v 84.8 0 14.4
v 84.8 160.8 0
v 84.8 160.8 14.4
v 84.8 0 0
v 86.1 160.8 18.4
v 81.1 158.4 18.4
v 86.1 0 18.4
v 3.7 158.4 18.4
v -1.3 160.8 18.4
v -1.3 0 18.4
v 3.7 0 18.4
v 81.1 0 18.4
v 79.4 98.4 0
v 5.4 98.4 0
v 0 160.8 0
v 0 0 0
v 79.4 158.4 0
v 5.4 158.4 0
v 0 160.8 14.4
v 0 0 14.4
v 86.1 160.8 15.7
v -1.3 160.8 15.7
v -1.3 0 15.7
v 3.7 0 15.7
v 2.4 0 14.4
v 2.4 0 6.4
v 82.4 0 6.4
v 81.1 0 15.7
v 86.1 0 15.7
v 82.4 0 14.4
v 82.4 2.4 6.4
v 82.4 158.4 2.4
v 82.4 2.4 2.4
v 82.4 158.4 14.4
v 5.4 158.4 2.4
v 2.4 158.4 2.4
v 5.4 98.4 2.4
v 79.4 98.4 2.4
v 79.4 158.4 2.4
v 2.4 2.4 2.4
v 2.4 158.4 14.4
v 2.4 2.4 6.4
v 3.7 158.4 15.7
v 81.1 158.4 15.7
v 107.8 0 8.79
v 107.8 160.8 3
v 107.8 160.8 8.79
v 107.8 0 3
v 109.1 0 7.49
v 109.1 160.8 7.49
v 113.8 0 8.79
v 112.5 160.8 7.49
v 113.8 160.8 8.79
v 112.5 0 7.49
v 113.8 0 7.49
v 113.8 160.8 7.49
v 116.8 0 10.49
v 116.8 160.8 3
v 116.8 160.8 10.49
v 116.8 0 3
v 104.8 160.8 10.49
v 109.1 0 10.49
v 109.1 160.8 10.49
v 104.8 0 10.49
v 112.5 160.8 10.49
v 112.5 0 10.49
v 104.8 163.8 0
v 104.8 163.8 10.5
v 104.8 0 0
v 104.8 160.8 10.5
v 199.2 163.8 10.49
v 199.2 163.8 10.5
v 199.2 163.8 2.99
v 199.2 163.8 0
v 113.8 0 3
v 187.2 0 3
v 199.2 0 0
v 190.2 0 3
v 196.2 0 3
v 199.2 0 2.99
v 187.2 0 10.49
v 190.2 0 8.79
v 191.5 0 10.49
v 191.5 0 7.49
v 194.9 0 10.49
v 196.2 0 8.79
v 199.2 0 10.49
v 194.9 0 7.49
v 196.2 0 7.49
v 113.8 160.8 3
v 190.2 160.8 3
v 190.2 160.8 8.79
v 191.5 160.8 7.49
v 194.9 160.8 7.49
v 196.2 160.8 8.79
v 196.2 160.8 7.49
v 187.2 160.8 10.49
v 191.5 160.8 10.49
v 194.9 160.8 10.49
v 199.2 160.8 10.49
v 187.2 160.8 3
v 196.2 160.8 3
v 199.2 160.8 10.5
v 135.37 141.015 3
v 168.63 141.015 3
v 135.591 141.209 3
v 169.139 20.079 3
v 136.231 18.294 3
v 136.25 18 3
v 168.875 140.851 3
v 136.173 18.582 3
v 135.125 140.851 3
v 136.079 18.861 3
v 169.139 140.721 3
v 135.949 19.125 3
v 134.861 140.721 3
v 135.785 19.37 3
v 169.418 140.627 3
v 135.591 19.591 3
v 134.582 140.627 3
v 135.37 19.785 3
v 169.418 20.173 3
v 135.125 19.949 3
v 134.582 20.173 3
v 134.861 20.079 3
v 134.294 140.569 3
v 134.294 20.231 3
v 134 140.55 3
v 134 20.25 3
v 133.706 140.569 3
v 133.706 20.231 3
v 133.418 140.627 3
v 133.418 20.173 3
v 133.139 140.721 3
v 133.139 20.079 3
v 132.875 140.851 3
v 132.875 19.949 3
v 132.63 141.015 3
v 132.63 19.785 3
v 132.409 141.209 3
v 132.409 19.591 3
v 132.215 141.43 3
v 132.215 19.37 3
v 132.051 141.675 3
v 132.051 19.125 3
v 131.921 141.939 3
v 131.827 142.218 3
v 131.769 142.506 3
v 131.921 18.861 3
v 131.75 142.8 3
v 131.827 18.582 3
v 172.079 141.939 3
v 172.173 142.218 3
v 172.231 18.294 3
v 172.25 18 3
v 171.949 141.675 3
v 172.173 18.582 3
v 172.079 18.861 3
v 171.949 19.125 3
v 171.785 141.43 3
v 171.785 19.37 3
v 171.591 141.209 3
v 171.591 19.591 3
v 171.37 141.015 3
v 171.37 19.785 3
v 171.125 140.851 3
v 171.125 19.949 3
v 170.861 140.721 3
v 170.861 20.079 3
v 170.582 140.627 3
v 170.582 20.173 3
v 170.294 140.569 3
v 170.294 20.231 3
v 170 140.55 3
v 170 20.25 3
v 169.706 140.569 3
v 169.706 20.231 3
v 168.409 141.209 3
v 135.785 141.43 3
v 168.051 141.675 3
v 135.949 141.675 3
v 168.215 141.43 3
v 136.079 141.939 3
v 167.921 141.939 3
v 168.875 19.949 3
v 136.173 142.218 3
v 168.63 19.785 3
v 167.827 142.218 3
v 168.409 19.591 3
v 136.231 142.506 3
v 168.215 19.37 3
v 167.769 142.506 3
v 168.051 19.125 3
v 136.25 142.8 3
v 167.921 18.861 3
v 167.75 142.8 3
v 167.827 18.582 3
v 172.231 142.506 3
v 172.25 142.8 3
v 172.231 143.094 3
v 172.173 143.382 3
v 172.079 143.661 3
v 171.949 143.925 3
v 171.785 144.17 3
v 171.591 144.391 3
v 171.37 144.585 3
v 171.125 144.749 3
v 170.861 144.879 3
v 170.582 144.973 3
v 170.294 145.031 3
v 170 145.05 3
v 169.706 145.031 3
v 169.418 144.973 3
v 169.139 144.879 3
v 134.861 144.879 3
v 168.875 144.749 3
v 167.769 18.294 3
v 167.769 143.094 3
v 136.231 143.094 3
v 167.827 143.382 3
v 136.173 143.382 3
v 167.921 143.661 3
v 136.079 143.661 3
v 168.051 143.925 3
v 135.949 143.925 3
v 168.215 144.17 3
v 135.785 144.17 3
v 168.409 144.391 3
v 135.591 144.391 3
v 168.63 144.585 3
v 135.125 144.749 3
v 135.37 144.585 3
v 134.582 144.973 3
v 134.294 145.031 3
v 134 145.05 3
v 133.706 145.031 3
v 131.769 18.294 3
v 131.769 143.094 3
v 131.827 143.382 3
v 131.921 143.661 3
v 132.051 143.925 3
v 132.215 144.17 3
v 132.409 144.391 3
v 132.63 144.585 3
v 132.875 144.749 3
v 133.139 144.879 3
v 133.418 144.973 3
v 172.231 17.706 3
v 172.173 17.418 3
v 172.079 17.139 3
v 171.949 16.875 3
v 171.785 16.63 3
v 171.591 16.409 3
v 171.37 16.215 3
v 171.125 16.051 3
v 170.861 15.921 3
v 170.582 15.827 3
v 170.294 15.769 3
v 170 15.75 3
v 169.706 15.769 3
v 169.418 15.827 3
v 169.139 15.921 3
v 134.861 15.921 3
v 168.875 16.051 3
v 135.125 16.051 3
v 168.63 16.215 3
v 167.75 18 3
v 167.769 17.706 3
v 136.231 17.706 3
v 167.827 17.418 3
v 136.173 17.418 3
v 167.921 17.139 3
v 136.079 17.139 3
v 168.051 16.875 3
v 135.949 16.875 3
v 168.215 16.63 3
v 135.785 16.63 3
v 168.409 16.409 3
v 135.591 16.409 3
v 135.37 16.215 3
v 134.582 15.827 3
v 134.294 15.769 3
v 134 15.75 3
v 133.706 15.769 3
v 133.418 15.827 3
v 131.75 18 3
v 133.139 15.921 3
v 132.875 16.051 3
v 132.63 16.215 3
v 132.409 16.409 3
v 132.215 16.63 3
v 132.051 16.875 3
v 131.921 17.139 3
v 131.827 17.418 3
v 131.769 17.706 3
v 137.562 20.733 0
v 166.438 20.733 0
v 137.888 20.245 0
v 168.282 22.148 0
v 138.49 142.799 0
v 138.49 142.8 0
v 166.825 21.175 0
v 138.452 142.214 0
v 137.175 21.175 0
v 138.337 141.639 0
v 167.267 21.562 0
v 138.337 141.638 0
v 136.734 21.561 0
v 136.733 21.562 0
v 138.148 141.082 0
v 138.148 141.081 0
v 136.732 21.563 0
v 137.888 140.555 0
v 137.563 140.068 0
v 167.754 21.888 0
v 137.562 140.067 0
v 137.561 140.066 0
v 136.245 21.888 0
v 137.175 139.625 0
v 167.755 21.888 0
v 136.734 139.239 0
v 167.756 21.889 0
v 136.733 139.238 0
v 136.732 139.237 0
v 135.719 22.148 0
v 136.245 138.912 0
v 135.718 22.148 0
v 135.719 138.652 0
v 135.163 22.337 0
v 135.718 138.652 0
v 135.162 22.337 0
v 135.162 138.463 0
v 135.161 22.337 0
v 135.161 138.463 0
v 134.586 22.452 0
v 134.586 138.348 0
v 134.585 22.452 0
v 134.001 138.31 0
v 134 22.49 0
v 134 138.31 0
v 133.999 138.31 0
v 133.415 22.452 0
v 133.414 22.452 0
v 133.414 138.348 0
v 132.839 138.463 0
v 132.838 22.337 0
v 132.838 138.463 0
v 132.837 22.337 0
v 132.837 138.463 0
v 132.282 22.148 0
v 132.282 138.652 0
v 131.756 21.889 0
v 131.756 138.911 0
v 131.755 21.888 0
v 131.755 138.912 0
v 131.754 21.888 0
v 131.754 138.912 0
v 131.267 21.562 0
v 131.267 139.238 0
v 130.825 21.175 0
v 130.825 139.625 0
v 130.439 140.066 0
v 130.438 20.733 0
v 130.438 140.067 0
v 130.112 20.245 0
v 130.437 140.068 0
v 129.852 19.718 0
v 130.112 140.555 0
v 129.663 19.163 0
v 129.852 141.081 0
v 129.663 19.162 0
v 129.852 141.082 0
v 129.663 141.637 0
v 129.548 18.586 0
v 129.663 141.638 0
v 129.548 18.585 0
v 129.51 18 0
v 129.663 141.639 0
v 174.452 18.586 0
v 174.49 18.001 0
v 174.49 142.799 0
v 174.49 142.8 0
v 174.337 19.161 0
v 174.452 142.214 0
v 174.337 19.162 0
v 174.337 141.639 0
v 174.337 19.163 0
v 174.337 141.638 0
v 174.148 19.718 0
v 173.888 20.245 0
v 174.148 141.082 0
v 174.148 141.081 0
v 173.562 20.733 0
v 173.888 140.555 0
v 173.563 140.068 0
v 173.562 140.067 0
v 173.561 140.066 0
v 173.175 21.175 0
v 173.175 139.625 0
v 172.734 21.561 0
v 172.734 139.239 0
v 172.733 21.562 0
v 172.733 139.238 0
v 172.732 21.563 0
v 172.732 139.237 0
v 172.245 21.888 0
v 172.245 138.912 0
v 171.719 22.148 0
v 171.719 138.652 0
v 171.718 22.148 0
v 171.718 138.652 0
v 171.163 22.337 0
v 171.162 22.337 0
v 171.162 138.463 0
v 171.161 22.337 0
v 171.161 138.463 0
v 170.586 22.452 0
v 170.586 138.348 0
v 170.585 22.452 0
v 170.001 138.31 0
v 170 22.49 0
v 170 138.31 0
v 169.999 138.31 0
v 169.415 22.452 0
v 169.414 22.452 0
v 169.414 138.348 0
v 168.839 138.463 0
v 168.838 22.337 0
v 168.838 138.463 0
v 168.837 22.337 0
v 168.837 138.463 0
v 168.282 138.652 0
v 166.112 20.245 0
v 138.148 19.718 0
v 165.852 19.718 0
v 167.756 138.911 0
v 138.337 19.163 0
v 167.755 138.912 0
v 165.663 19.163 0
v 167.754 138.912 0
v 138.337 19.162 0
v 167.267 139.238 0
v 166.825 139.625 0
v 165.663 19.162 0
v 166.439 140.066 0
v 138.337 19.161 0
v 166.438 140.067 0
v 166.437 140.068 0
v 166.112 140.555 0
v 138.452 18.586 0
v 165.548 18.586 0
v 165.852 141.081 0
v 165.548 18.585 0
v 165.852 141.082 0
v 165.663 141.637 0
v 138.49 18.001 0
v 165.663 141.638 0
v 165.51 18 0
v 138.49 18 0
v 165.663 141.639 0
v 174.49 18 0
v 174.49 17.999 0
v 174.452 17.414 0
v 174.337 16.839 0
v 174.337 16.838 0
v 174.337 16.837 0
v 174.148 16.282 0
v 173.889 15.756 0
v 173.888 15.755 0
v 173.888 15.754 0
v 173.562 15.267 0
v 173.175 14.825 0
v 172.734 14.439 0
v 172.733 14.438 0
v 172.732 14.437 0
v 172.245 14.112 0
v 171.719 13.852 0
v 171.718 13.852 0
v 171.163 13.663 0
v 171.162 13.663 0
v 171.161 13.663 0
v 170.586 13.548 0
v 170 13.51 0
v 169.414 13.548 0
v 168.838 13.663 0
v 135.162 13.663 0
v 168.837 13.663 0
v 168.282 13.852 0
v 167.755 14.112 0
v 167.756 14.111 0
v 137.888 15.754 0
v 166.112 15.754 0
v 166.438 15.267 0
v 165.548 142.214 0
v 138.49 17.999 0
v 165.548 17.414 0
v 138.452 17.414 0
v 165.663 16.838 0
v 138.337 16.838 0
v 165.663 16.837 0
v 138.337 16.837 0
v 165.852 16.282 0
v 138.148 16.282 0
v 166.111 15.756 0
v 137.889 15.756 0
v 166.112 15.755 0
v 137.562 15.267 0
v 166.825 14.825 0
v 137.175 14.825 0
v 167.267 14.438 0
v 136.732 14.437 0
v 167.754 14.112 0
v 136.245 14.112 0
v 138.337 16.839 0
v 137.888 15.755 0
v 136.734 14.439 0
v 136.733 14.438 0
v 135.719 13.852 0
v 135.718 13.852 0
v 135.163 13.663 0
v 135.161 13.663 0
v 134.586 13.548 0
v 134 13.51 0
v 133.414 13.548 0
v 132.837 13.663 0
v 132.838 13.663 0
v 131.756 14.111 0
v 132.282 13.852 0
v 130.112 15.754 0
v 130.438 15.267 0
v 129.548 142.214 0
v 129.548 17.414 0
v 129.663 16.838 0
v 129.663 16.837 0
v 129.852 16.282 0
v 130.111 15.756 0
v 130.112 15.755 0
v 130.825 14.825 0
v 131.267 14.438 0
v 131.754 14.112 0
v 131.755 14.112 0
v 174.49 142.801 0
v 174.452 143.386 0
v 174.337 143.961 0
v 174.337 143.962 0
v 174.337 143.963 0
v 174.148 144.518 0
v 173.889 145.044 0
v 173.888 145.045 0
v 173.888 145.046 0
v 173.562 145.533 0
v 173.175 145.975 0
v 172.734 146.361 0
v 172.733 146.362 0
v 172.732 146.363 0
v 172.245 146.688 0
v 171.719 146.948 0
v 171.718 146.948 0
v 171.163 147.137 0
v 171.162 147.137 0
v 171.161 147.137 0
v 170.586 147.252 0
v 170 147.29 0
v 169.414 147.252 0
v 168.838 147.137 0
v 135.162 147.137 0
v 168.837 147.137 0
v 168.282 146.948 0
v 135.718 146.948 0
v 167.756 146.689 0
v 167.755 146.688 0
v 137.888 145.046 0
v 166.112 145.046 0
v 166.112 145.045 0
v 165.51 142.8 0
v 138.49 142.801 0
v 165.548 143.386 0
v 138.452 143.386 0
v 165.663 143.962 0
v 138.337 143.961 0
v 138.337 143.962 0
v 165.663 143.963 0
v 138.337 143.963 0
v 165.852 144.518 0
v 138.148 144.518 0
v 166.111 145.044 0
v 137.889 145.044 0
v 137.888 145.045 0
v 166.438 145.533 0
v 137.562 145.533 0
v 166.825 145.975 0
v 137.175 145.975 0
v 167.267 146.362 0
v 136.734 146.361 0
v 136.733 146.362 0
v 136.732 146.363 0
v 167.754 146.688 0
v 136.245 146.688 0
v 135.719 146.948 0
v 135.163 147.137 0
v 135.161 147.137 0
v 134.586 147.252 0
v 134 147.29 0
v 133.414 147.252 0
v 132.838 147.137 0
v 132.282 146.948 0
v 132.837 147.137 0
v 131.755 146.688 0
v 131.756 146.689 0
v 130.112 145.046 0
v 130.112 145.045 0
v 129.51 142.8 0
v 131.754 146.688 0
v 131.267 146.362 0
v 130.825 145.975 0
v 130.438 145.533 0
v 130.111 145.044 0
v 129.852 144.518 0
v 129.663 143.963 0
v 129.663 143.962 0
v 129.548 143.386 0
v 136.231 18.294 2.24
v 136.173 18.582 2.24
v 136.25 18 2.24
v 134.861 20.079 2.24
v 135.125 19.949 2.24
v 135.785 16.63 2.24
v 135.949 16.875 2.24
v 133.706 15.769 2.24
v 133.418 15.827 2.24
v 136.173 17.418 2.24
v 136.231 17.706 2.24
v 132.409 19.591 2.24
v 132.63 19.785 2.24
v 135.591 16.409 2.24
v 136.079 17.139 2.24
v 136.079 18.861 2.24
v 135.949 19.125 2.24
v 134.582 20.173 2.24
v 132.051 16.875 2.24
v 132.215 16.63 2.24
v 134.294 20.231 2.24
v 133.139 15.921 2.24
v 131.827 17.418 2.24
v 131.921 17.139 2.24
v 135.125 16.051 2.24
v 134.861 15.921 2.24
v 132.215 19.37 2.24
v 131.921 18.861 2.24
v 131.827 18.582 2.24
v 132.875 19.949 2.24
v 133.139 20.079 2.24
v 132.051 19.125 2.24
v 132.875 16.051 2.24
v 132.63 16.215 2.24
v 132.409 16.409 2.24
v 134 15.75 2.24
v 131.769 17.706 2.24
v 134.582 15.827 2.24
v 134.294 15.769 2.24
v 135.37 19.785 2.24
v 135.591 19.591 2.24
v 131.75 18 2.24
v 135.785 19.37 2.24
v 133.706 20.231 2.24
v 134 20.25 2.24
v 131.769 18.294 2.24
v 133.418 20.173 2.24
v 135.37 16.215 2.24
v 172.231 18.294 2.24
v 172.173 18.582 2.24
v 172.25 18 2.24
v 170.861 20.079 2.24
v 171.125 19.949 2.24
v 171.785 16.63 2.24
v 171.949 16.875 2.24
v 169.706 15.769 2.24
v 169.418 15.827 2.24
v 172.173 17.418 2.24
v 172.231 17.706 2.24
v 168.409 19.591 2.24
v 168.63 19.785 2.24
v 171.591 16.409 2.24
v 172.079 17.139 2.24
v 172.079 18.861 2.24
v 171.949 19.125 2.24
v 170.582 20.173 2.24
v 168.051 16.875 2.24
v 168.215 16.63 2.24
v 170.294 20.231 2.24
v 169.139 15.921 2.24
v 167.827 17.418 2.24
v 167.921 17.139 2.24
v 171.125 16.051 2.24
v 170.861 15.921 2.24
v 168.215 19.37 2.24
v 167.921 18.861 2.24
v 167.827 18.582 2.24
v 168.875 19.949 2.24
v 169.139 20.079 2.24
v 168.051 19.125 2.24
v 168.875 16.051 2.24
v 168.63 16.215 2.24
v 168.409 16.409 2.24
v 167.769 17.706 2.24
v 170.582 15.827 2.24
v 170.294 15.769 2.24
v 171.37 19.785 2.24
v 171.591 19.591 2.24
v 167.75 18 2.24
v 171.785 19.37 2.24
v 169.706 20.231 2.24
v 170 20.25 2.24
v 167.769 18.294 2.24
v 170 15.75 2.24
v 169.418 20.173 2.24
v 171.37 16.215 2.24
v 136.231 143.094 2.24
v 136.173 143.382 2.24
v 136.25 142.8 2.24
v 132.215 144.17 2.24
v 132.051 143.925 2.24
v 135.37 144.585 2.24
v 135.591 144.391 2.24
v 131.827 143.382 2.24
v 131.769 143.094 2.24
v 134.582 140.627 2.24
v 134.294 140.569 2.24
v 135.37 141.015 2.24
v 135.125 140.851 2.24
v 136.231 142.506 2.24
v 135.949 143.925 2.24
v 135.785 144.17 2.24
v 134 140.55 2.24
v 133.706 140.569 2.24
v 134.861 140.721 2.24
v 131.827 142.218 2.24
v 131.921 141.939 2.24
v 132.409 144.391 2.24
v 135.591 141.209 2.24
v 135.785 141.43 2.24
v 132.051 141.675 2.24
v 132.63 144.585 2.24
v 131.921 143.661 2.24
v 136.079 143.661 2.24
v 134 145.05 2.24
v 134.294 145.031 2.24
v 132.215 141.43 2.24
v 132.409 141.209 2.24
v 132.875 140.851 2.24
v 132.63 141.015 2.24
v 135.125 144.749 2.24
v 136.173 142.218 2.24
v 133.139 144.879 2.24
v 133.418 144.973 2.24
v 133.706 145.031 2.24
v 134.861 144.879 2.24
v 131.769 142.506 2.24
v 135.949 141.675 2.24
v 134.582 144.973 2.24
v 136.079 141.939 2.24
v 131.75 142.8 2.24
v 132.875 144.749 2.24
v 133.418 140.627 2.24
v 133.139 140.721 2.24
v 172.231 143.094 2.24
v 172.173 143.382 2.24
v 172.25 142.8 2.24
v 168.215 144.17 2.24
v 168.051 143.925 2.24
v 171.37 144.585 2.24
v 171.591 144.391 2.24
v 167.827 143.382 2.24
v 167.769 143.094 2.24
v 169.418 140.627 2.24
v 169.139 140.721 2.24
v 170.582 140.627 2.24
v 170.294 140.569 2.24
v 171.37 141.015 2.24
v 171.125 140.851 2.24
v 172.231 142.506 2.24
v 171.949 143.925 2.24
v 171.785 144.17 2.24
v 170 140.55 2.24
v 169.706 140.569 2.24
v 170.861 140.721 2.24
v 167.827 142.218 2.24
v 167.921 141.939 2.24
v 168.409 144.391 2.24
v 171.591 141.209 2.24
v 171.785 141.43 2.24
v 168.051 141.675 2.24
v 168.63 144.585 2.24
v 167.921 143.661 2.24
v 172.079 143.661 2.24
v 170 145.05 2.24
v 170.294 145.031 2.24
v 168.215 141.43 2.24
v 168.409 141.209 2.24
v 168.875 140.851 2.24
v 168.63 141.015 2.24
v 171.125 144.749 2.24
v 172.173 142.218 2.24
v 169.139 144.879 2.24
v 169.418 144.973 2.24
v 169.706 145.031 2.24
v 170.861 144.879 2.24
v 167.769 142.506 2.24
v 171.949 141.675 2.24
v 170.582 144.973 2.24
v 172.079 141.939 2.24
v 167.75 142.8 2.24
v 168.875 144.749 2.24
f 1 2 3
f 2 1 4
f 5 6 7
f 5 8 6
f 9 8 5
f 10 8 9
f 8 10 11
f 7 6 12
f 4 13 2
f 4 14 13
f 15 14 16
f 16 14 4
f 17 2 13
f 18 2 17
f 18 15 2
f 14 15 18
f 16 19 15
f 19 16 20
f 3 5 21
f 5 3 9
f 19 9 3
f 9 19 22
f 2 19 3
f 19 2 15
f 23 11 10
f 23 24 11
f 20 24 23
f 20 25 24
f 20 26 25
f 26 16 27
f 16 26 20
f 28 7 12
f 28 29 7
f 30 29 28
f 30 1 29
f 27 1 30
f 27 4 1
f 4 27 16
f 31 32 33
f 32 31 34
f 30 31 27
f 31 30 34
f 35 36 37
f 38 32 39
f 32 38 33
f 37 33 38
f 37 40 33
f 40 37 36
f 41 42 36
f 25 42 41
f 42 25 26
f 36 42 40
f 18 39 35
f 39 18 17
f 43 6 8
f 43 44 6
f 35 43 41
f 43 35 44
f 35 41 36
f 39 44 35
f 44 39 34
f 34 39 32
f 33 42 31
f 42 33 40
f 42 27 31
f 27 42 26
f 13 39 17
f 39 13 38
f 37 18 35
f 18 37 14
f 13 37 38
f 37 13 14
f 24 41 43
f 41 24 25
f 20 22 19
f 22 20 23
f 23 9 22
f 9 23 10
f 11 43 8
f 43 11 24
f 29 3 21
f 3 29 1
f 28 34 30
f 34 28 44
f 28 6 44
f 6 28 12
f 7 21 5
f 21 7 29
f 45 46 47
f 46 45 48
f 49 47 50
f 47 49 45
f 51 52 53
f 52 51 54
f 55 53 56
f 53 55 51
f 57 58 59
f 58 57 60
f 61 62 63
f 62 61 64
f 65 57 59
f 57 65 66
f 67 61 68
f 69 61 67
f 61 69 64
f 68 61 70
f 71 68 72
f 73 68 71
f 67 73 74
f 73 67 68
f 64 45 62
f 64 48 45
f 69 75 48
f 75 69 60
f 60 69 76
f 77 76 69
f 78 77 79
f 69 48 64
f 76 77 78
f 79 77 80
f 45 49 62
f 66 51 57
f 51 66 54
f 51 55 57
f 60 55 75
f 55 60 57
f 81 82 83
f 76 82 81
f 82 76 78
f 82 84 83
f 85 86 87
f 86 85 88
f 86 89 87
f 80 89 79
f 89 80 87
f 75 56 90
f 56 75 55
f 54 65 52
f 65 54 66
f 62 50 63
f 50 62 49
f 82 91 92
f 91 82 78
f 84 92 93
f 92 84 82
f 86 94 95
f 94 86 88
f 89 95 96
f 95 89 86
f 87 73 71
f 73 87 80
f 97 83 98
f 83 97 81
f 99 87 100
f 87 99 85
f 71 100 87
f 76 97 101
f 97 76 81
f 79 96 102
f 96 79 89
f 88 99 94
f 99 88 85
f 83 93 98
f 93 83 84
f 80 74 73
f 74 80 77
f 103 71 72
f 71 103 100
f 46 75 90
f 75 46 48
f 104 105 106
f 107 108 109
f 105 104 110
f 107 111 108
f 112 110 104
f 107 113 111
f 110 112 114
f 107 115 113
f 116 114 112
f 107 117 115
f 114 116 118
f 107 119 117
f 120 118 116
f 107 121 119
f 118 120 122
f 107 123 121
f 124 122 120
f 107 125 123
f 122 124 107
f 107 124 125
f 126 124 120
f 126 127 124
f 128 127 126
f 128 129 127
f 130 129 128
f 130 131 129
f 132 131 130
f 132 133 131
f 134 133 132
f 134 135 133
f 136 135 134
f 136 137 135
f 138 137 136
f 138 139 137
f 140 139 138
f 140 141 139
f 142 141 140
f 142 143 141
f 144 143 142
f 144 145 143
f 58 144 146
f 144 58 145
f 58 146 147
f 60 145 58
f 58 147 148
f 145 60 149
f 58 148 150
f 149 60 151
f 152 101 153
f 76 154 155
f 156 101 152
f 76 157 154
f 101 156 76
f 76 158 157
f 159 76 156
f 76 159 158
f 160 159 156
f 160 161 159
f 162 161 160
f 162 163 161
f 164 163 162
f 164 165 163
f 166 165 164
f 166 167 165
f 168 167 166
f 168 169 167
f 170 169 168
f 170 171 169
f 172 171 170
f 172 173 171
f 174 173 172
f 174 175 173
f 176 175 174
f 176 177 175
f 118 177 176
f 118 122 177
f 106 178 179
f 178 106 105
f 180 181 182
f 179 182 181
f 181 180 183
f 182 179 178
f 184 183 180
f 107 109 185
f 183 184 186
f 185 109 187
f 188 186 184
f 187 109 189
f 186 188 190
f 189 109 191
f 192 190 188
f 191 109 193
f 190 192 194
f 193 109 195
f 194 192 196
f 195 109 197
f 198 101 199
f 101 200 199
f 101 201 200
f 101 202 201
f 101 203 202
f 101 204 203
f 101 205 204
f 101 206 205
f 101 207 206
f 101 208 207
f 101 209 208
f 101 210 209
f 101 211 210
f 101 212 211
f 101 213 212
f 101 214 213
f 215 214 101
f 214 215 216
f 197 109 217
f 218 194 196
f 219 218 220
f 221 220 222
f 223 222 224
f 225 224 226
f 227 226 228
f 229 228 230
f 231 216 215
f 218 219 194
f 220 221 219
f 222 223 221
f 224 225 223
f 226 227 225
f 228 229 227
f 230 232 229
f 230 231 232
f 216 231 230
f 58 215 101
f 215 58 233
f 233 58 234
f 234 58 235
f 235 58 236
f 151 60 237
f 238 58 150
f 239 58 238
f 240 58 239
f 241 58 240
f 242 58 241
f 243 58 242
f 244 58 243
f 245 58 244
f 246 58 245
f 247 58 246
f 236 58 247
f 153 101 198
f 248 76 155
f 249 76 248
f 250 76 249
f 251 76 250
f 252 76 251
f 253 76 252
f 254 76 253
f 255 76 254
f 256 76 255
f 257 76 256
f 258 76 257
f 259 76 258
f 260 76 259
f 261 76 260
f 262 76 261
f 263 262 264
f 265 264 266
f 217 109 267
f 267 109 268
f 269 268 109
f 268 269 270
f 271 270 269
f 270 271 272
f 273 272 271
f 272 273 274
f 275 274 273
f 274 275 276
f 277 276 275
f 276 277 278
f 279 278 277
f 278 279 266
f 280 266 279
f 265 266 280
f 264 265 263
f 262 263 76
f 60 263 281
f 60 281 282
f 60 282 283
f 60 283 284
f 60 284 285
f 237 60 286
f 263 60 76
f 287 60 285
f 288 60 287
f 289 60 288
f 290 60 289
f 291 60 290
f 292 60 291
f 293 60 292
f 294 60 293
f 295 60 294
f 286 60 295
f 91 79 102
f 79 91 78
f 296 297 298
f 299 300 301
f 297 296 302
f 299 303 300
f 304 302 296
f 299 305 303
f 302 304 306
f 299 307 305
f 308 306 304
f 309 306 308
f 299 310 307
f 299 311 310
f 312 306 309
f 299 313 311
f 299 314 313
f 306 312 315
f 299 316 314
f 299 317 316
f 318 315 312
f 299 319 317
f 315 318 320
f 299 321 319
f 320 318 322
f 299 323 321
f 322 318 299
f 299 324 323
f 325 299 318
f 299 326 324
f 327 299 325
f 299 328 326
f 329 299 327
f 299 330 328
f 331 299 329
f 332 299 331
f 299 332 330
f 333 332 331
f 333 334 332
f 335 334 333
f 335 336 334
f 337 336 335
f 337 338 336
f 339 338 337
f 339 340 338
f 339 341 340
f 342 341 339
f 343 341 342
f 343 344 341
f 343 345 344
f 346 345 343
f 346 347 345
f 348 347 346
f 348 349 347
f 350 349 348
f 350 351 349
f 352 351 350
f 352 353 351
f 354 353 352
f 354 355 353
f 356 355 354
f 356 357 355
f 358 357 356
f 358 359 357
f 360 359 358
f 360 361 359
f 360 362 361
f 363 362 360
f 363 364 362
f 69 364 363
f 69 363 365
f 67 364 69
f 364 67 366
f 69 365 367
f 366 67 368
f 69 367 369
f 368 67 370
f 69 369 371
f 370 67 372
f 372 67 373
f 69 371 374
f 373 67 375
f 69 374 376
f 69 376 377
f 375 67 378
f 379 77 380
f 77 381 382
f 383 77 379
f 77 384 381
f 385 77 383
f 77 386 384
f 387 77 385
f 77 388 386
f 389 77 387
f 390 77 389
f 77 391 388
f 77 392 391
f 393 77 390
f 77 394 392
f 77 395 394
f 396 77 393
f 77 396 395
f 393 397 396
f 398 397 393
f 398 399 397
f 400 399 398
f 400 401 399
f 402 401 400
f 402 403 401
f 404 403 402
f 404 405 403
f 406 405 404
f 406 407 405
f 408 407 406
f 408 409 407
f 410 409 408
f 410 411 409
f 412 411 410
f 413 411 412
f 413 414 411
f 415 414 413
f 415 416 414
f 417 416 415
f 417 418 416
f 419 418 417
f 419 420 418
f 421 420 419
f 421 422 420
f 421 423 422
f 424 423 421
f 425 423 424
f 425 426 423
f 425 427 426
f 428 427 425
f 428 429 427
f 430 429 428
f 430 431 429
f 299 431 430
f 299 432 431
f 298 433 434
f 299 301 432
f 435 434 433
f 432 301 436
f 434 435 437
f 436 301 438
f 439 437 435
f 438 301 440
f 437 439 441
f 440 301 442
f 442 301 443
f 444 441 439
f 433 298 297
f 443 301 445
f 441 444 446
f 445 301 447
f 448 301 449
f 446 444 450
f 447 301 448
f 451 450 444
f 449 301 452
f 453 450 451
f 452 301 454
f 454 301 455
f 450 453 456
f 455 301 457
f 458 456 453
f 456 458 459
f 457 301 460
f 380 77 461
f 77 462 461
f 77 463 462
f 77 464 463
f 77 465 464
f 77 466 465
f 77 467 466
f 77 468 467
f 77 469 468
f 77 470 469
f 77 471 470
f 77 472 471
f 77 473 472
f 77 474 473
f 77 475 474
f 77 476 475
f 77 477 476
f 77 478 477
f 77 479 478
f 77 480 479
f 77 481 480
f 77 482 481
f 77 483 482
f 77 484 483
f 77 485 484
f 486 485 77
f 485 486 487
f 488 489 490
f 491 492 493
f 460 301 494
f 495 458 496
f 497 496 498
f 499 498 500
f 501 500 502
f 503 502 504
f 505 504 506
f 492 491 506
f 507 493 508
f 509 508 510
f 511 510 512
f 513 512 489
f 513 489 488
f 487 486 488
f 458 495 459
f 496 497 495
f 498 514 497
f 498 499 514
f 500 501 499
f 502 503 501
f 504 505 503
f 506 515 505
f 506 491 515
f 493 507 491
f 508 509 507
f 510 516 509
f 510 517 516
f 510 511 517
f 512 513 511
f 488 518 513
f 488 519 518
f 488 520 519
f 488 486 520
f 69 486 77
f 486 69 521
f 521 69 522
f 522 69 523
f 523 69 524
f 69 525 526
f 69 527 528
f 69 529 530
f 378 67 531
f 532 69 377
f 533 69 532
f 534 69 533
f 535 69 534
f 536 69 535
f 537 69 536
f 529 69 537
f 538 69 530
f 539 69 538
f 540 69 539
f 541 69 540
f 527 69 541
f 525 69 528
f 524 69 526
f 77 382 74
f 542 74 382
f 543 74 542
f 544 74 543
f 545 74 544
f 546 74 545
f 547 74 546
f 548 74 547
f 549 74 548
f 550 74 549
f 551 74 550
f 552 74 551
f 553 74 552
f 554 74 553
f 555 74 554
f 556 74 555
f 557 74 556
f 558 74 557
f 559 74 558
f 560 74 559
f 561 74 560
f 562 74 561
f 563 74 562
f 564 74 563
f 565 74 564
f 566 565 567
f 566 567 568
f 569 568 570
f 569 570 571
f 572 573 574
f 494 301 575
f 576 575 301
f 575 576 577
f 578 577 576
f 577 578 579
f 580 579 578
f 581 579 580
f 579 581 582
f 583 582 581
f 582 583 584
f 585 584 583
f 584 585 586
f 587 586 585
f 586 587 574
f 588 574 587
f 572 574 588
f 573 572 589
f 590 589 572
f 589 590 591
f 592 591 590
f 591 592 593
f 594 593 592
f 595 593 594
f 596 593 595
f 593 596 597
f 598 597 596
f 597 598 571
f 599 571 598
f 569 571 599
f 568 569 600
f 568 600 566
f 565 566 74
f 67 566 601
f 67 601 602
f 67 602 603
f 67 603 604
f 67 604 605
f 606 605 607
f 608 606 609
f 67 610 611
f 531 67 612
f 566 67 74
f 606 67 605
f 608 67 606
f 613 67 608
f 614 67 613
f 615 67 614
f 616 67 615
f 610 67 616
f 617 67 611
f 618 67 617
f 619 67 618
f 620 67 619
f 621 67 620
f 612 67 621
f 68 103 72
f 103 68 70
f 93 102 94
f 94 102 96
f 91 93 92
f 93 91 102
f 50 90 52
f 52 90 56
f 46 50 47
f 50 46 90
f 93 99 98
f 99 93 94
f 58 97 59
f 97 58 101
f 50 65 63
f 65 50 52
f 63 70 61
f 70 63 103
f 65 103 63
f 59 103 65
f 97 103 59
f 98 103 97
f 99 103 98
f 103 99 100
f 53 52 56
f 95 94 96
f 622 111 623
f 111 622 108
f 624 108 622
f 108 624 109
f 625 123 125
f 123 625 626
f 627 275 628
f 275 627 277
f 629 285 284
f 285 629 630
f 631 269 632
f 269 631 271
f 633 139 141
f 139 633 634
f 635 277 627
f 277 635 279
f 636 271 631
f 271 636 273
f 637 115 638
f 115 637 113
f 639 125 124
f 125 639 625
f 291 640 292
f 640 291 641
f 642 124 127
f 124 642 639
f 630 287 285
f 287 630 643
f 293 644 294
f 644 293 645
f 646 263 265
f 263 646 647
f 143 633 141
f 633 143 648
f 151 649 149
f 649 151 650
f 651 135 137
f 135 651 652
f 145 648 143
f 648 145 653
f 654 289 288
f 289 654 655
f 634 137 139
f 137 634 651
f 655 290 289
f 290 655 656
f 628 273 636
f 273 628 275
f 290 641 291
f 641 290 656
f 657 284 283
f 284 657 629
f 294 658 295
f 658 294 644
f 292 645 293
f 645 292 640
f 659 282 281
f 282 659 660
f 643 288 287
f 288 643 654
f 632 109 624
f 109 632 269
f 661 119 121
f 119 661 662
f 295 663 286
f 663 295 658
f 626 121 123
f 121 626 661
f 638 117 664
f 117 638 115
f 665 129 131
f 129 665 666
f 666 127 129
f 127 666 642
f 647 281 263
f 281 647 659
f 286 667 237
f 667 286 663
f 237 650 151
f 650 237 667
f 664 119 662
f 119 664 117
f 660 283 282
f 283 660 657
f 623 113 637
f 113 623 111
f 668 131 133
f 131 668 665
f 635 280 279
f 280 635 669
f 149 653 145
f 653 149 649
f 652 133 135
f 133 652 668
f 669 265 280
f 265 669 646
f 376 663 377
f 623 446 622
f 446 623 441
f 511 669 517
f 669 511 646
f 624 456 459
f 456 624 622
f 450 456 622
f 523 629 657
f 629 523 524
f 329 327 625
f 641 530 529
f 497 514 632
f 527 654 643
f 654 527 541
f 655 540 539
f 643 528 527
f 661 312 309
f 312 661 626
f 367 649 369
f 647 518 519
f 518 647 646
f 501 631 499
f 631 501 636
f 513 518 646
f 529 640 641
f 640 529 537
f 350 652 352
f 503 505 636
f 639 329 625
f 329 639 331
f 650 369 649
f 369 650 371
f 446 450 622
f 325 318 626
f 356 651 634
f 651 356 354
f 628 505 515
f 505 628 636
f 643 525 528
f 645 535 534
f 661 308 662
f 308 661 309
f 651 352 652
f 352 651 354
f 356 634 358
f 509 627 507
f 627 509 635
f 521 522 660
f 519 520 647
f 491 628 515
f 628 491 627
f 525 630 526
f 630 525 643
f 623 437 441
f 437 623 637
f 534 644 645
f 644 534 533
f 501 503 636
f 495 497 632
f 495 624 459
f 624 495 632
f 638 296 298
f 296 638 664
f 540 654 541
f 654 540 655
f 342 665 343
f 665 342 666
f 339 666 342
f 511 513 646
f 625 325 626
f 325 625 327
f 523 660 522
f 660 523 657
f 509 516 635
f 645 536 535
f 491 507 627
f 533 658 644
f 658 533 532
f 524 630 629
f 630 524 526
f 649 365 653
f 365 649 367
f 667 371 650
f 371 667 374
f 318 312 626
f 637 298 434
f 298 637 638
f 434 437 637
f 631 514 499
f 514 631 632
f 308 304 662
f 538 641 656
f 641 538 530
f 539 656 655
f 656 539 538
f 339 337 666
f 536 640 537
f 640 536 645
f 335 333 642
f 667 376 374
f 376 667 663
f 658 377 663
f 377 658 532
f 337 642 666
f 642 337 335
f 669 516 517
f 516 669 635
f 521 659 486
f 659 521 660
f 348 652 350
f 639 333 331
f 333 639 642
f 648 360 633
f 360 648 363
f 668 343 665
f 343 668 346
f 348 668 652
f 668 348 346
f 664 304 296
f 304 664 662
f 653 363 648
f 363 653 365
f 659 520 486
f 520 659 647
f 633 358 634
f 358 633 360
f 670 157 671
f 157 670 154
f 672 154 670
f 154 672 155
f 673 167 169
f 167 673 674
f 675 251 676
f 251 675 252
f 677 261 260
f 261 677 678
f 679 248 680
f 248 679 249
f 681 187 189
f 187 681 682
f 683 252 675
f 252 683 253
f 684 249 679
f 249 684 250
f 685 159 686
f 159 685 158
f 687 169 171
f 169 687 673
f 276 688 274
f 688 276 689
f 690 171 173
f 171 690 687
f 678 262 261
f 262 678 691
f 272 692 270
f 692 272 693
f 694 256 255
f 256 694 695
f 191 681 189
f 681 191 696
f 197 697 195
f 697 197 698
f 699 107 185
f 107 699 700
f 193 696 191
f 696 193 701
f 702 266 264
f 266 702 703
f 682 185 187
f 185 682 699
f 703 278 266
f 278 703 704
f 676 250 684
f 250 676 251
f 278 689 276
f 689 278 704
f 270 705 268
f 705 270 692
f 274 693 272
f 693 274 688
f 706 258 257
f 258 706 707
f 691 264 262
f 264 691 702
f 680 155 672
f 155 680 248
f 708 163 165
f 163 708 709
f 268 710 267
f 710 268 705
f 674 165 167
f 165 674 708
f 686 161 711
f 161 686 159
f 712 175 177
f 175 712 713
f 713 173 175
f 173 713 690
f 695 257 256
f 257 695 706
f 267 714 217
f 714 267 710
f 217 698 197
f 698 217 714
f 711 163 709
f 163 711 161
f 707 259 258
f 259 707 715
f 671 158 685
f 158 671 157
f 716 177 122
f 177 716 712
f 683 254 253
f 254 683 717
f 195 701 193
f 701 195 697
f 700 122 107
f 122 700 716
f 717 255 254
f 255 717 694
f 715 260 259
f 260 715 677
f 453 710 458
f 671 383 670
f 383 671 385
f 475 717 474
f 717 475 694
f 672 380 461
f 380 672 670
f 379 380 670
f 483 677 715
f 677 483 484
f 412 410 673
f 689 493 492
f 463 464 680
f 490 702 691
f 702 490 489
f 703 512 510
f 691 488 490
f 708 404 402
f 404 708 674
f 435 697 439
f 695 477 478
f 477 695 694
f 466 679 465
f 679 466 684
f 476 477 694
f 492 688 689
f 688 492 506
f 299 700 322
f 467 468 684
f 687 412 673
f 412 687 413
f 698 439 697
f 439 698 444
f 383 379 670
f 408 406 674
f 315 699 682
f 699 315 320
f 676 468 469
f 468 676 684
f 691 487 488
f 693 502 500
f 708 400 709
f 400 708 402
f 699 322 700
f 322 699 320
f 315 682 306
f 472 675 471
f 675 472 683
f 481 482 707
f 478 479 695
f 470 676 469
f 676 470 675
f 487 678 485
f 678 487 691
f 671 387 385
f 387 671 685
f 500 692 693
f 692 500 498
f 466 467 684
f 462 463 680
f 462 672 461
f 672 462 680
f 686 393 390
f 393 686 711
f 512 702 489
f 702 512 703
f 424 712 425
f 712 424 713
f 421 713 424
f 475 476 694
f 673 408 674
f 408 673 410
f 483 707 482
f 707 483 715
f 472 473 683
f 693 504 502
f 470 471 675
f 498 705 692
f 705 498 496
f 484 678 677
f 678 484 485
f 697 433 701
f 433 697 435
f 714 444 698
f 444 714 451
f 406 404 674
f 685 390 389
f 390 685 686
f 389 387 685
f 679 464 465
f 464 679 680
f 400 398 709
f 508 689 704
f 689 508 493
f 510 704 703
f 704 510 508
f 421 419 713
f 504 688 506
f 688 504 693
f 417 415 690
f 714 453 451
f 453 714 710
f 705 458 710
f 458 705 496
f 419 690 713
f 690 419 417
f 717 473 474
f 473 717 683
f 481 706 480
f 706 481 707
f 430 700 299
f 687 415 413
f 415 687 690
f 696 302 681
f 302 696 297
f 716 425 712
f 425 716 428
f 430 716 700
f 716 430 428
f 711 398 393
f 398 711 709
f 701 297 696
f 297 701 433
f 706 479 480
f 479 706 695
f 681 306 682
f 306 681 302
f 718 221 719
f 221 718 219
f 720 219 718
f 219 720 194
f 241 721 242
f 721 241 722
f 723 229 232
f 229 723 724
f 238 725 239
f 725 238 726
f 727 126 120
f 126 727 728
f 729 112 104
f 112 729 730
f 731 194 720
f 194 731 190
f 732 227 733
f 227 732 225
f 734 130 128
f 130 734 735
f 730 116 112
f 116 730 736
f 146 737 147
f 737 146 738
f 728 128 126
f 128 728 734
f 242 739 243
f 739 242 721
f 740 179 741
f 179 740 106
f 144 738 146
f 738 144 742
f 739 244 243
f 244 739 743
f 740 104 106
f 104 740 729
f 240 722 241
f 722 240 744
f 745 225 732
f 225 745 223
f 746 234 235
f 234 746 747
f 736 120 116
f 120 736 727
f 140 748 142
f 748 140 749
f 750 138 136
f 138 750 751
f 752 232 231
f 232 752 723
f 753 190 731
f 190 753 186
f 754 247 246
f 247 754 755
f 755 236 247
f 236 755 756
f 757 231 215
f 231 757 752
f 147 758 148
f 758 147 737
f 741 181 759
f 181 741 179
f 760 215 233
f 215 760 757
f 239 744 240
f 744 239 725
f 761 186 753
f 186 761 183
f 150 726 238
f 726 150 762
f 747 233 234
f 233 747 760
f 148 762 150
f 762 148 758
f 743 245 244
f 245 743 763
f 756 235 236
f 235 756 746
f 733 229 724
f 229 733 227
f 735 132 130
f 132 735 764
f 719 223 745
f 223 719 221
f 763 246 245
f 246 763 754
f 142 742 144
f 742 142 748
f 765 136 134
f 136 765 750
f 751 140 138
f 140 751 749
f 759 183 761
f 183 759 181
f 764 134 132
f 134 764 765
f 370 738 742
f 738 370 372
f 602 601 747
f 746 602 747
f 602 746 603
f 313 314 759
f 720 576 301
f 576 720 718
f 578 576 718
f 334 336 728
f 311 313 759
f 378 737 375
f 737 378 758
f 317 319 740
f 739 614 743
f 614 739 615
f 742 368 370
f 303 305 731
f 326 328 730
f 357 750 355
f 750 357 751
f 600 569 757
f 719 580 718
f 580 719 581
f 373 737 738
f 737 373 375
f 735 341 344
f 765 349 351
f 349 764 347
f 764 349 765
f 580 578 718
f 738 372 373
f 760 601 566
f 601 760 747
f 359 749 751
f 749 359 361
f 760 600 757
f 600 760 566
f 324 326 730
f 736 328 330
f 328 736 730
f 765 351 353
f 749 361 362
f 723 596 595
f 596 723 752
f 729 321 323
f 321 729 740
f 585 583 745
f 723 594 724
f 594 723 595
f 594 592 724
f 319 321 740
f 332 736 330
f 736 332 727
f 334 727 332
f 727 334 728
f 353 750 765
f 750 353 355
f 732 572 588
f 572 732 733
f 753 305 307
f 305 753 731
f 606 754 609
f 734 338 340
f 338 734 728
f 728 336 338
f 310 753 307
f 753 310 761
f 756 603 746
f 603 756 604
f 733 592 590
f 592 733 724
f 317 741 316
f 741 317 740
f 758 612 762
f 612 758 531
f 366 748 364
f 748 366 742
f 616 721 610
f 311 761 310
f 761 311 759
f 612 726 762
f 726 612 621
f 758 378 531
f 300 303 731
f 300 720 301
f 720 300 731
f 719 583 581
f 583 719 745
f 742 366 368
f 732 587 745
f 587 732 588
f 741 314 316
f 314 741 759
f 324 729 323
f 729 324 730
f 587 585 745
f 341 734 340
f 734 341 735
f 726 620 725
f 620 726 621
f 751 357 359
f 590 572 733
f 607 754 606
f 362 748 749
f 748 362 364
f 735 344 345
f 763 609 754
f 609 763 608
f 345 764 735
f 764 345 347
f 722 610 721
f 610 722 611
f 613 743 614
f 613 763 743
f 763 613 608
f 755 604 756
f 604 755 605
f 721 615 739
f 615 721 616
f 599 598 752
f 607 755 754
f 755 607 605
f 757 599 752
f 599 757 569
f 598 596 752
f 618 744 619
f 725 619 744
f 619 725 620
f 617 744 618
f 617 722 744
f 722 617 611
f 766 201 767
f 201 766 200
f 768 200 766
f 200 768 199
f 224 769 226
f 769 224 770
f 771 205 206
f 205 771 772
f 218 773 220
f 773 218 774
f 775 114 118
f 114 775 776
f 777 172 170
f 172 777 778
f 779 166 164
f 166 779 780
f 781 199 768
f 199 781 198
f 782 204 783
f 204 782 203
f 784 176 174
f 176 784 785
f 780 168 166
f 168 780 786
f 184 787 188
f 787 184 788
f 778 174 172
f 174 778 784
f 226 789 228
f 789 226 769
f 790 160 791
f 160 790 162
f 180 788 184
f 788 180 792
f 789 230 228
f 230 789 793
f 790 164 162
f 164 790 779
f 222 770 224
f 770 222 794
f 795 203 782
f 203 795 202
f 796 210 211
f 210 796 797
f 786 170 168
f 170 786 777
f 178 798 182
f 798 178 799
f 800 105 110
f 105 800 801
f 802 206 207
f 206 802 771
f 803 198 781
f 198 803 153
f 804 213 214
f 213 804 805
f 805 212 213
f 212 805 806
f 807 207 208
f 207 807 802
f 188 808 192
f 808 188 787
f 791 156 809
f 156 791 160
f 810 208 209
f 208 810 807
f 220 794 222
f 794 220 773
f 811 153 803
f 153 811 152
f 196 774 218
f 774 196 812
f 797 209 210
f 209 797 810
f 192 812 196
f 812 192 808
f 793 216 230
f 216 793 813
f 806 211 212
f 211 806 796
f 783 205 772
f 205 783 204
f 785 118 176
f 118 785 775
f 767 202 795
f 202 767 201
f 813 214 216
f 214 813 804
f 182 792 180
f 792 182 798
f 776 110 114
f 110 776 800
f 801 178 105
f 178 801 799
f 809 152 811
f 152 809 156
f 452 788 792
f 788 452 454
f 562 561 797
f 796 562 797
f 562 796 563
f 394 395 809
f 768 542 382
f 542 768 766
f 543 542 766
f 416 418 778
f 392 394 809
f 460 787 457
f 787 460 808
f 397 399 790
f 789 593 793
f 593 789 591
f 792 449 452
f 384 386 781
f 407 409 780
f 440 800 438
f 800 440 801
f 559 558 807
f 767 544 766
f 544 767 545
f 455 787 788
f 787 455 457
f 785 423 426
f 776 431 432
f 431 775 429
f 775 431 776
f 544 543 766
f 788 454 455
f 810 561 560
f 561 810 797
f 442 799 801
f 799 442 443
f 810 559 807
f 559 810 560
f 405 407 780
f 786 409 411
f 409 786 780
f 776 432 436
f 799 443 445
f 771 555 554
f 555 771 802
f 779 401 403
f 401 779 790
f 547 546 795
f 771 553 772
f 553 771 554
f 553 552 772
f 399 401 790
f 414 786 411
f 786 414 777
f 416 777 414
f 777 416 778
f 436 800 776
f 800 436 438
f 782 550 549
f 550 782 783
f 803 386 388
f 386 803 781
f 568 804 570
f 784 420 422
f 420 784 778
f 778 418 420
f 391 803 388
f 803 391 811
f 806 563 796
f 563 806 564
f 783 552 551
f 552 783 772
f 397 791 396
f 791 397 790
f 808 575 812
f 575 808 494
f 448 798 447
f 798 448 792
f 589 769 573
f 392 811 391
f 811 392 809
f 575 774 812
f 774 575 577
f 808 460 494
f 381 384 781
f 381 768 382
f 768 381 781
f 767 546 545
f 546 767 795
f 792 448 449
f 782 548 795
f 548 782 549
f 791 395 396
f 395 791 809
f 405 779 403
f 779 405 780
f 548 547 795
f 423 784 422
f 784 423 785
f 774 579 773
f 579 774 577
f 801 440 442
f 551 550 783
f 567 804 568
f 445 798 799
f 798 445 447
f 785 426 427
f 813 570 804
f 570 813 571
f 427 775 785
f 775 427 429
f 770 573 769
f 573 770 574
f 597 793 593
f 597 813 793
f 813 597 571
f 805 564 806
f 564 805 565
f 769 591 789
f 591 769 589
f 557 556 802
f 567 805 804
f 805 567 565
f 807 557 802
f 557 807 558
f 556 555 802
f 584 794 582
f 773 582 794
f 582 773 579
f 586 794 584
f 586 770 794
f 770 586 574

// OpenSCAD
// A ceiling pocket for a phone used as Lantern's camera over the cutting table.
//
// Two printed parts and four screws:
//   plate   screws to the ceiling, with a C-channel along each side.
//   pocket  a tray with a solid floor and a window for the camera; a bead
//           along the top of each wall slides into the plate's channels.
// The phone drops into the pocket from its open end, screen towards the
// ceiling, camera end first, and lies on the floor with its camera looking
// down through the window. Nothing clips or grips it: a lip at the open end
// stops it sliding out, and it comes out by pushing it up through the
// window and drawing it back. The fit is loose on purpose; measure the phone
// in its case and put the numbers below, in millimetres.
//
// Both parts print without supports: the pocket floor down, the plate flat
// with its channels up. Use PETG if it will sit near the projector's warm
// air; PLA sags around 55 °C.
//
// Render with OpenSCAD:
//   openscad -o pocket.stl -D 'part="pocket"' phone-pocket.scad
//   openscad -o plate.stl  -D 'part="plate"'  phone-pocket.scad

// ---------- the phone, in its case
phone_w = 76;   // width (the short side)
phone_l = 152;  // length
phone_t = 10;   // thickness, including the camera bump

// ---------- the pocket
clearance = 2;      // each side, so it drops in and out without a fight
headroom = 6;       // above the phone, so it can tilt in over the lip
wall = 2.4;
floor_t = 2.4;
lip = 4;            // height of the lip across the open end, above the floor
window_l = 60;      // the window's length from the closed end: covers any phone's camera island
window_rail = 3;    // floor left either side of the window; a phone camera is at least 5 mm from the edge

// ---------- the slide
bead = 1.3;         // how far the top bead of each wall stands proud, each side
bead_h = 4;
slide_gap = 0.5;    // clearance in the channel; raise it if the slide is tight on your printer
post = 3;           // channel wall thickness
plate_t = 3;
screw_d = 4.5;      // clearance for a 4 mm screw
screw_head = 9;     // countersink

part = "both";      // "pocket", "plate", "both" (side by side), "fitted" (the plate on the pocket) or "cut" (a slice through the slide)

// ---------- derived
inner_w = phone_w + 2 * clearance;
inner_l = phone_l + 2 * clearance;
inner_h = phone_t + headroom;
outer_w = inner_w + 2 * wall;
outer_l = inner_l + 2 * wall;
wall_h = floor_t + inner_h;          // the walls' full height, bead included
channel_in_w = wall + 2 * bead + 2 * slide_gap;   // inside the C, around the bead
channel_in_h = bead_h + slide_gap;
channel_mouth = wall + 2 * slide_gap;             // the C's opening, around the plain wall
channel_h = channel_in_h + post;                  // the C's total height, lips included
plate_w = outer_w + 2 * post + 2 * (bead + slide_gap);
plate_l = outer_l + post;            // one end stop

$fn = 48;

module pocket() {
  difference() {
    // the outer block
    cube([outer_w, outer_l, wall_h]);
    // the inside, open at the top and at the open end (y = 0) above the lip
    translate([wall, wall, floor_t]) cube([inner_w, inner_l, inner_h + 1]);
    translate([wall, -1, floor_t + lip]) cube([inner_w, wall + 2, inner_h + 1]);
    // the camera window, from the closed end
    translate([wall + window_rail, outer_l - wall - window_l, -1]) cube([inner_w - 2 * window_rail, window_l, floor_t + 2]);
  }
  // the bead along the top of each side wall, chamfered underneath so it prints floor down
  for (x = [0, outer_w - wall]) {
    translate([x, 0, wall_h - bead_h]) bead_profile();
  }
}

module bead_profile() {
  // a bead the length of the wall, standing proud by `bead` each side, with a 45° chamfer below
  hull() {
    translate([-bead, 0, bead]) cube([wall + 2 * bead, outer_l, bead_h - bead]);
    translate([0, 0, 0]) cube([wall, outer_l, bead_h]);
  }
}

module plate() {
  difference() {
    union() {
      cube([plate_w, plate_l, plate_t]);
      // a C-channel along each side, lips at the top, chamfered so it prints flat
      for (side = [0, 1]) translate([channel_x(side), 0, plate_t - 0.01]) channel();
      // the end stop
      translate([0, plate_l - post, 0]) cube([plate_w, post, plate_t + channel_h]);
    }
    // four countersunk screw holes down the middle, clear of the channels
    for (y = [18, plate_l - post - 18]) for (x = [plate_w / 2 - 18, plate_w / 2 + 18]) {
      translate([x, y, -1]) cylinder(d = screw_d, h = plate_t + 2);
      translate([x, y, -0.01]) cylinder(d1 = screw_head, d2 = screw_d, h = (screw_head - screw_d) / 2);
    }
  }
}

// the x of the centre of the channel on `side`, matching the pocket's wall centres
function channel_x(side) = (bead + slide_gap + post) + wall / 2 + side * (outer_w - wall);

module channel() {
  // centred on x = 0: two posts with inward lips, leaving a mouth for the wall and room for the bead
  w_out = channel_in_w + 2 * post;
  translate([-w_out / 2, 0, 0]) difference() {
    cube([w_out, plate_l, channel_h]);
    // the room for the bead
    translate([post, -1, 0]) cube([channel_in_w, plate_l + 2, channel_in_h]);
    // the mouth for the wall
    translate([post + (channel_in_w - channel_mouth) / 2, -1, 0]) cube([channel_mouth, plate_l + 2, channel_h + 1]);
    // chamfer the lips' underside so they print without support
    for (s = [0, 1]) {
      lx = s == 0 ? post : post + (channel_in_w + channel_mouth) / 2;
      translate([lx, -1, channel_in_h]) rotate([-90, 0, 0]) linear_extrude(plate_l + 2)
        polygon(s == 0 ? [[0, 0], [(channel_in_w - channel_mouth) / 2, 0], [0, -(channel_in_w - channel_mouth) / 2]]
                       : [[(channel_in_w - channel_mouth) / 2, 0], [0, 0], [(channel_in_w - channel_mouth) / 2, -(channel_in_w - channel_mouth) / 2]]);
    }
  }
}

// The plate turned over and lowered onto the pocket, as on the ceiling: the beads hang on the channel lips,
// the end stop sits just beyond the open end.
module fitted() {
  pocket();
  translate([-(bead + slide_gap + post), -post, wall_h - post - bead_h])
    translate([0, plate_l, 0]) rotate([180, 0, 0]) translate([0, 0, -plate_t - channel_h]) plate();
}

if (part == "pocket") pocket();
else if (part == "plate") plate();
else if (part == "fitted") fitted();
else if (part == "cut") projection(cut = true) rotate([90, 0, 0]) translate([0, -outer_l / 2, 0]) fitted();
else {
  pocket();
  translate([outer_w + 20, 0, 0]) plate();
}
